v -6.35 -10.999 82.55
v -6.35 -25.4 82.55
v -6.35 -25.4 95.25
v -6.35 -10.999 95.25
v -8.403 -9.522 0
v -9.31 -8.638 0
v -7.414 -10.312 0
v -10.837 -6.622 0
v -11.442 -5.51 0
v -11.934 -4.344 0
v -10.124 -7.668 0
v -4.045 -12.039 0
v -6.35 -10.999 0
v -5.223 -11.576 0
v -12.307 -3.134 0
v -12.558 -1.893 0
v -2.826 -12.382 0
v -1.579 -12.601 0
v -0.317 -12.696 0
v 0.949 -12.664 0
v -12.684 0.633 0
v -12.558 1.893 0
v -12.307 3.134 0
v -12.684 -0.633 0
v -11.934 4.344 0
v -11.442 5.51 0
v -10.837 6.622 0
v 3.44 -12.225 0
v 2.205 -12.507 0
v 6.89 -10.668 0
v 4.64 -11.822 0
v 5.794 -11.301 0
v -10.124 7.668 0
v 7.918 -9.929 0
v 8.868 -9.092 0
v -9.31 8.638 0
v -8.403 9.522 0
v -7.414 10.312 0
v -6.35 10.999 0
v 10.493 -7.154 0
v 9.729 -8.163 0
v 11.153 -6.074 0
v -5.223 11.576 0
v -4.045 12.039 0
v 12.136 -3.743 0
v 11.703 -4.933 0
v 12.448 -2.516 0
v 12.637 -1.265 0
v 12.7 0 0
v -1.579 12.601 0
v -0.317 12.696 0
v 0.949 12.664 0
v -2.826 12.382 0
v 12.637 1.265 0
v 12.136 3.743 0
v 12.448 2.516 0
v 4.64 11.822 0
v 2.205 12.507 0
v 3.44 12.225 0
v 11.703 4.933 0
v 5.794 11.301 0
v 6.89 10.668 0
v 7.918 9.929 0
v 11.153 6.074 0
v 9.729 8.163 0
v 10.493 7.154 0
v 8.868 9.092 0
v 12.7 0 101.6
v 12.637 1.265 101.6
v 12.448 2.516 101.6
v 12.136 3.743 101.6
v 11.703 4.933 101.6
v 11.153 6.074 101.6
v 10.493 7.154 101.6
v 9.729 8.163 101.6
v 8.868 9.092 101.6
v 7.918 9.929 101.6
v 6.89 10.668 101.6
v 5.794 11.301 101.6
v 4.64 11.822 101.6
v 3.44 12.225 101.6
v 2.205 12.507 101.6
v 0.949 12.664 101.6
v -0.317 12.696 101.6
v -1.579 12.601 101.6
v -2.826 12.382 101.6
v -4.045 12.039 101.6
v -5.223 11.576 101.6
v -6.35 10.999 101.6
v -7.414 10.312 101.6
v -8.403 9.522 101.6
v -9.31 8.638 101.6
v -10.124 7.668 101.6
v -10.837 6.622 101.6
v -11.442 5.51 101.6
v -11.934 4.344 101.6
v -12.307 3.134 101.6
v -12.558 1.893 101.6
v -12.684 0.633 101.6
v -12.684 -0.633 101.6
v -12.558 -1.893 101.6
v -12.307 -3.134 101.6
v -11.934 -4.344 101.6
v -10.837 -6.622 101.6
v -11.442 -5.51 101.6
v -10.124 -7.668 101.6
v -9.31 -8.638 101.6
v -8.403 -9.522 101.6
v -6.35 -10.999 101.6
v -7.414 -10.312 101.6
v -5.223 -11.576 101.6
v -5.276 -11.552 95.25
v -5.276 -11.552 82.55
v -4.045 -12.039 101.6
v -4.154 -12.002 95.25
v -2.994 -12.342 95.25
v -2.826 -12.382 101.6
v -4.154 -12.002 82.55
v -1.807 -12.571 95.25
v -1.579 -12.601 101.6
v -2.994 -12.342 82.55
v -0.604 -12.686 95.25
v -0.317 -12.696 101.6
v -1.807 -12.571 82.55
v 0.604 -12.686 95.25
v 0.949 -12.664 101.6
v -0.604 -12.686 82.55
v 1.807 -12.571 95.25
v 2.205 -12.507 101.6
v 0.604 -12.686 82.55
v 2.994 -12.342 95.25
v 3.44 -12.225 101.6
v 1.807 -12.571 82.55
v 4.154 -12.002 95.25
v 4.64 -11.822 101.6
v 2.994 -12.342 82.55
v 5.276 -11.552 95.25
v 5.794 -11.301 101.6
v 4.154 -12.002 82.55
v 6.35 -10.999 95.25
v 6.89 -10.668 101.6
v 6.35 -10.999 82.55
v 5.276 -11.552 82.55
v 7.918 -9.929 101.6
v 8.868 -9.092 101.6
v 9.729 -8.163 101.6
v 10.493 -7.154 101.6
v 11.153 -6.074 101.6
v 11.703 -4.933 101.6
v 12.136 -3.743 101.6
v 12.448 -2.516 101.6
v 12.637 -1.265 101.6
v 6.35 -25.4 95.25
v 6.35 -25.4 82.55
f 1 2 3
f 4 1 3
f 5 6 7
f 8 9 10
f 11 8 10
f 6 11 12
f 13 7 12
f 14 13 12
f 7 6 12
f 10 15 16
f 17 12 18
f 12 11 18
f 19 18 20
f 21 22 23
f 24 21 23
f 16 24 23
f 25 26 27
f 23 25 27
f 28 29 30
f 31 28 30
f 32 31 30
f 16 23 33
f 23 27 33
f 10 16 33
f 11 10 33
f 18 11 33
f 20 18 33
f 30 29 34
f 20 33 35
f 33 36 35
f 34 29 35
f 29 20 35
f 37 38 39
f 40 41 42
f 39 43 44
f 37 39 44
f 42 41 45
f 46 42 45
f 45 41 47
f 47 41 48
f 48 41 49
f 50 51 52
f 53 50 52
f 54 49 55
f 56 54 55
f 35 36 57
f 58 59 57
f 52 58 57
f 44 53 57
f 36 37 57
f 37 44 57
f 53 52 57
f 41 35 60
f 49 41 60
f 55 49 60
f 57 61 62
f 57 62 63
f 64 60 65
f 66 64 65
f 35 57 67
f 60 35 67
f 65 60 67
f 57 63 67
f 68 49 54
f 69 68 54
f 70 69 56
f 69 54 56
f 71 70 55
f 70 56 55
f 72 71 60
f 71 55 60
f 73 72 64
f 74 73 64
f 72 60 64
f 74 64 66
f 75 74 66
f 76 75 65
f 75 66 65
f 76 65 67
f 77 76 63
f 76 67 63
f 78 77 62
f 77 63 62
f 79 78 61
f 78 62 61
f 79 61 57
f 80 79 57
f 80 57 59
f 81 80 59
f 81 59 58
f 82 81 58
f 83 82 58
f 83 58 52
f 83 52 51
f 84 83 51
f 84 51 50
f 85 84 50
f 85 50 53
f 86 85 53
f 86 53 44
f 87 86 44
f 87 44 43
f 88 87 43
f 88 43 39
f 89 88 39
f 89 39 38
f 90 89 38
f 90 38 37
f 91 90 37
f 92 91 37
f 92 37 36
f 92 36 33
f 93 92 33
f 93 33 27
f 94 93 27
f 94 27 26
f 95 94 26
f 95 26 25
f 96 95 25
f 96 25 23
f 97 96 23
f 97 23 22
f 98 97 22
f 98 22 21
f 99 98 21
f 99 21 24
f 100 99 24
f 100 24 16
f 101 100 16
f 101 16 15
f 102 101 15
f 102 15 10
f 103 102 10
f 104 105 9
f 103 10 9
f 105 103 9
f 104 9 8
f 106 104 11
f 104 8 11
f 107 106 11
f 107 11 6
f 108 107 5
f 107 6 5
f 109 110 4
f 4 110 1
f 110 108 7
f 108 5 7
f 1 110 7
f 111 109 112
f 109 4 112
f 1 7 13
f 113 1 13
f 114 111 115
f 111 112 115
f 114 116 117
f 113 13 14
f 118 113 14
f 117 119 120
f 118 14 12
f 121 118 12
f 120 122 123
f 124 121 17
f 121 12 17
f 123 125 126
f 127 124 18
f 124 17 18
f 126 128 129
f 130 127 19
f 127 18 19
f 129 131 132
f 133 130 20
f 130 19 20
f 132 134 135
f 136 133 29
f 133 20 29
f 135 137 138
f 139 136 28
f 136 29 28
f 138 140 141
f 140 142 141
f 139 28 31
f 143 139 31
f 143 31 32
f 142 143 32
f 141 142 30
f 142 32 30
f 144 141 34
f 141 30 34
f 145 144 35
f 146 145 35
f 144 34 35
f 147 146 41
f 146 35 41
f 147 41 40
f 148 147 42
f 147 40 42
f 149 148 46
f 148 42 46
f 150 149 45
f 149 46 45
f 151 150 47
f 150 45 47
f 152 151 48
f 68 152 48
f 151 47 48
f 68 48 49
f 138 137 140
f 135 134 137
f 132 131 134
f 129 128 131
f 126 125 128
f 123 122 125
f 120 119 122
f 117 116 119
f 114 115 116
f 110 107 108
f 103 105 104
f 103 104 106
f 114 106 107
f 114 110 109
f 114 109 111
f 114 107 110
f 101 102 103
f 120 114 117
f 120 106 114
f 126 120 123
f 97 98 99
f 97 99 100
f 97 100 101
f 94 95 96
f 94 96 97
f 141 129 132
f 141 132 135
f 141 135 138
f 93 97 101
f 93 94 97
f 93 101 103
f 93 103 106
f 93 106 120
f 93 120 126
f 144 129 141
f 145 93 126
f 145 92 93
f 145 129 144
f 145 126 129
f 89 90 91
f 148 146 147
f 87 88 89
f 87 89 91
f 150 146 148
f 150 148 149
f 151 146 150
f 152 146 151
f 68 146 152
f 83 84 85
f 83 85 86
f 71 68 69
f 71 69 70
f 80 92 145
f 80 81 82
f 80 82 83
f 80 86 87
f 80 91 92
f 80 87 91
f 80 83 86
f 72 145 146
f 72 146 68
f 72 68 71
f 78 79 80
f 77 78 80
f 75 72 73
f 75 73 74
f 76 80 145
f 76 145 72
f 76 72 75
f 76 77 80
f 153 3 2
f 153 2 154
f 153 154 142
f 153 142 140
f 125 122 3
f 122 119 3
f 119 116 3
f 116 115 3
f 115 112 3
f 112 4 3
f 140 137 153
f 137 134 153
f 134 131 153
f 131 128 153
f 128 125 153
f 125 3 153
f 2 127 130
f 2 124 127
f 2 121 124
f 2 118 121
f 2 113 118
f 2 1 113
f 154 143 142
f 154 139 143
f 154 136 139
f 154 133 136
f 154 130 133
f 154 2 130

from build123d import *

# Parameters (mm, degrees)
F0_R     = 12.7
F1_DEPTH = 101.6
F3_W     = 12.7
F3_H     = 12.7


with BuildPart() as f1:
    # F0 (on Top) → F1 (new body)
    with BuildSketch(Plane.XY):
        Circle(F0_R)
    extrude(amount=F1_DEPTH)

    # F3 (on offset) → F4 (join, up to the next surface of F1)
    with BuildSketch(Plane.XZ.offset(25.4)):
        with Locations((0, 88.9)):
            Rectangle(F3_W, F3_H)
    extrude(until=Until.NEXT, dir=(0, 1, 0))


solid = f1.part
